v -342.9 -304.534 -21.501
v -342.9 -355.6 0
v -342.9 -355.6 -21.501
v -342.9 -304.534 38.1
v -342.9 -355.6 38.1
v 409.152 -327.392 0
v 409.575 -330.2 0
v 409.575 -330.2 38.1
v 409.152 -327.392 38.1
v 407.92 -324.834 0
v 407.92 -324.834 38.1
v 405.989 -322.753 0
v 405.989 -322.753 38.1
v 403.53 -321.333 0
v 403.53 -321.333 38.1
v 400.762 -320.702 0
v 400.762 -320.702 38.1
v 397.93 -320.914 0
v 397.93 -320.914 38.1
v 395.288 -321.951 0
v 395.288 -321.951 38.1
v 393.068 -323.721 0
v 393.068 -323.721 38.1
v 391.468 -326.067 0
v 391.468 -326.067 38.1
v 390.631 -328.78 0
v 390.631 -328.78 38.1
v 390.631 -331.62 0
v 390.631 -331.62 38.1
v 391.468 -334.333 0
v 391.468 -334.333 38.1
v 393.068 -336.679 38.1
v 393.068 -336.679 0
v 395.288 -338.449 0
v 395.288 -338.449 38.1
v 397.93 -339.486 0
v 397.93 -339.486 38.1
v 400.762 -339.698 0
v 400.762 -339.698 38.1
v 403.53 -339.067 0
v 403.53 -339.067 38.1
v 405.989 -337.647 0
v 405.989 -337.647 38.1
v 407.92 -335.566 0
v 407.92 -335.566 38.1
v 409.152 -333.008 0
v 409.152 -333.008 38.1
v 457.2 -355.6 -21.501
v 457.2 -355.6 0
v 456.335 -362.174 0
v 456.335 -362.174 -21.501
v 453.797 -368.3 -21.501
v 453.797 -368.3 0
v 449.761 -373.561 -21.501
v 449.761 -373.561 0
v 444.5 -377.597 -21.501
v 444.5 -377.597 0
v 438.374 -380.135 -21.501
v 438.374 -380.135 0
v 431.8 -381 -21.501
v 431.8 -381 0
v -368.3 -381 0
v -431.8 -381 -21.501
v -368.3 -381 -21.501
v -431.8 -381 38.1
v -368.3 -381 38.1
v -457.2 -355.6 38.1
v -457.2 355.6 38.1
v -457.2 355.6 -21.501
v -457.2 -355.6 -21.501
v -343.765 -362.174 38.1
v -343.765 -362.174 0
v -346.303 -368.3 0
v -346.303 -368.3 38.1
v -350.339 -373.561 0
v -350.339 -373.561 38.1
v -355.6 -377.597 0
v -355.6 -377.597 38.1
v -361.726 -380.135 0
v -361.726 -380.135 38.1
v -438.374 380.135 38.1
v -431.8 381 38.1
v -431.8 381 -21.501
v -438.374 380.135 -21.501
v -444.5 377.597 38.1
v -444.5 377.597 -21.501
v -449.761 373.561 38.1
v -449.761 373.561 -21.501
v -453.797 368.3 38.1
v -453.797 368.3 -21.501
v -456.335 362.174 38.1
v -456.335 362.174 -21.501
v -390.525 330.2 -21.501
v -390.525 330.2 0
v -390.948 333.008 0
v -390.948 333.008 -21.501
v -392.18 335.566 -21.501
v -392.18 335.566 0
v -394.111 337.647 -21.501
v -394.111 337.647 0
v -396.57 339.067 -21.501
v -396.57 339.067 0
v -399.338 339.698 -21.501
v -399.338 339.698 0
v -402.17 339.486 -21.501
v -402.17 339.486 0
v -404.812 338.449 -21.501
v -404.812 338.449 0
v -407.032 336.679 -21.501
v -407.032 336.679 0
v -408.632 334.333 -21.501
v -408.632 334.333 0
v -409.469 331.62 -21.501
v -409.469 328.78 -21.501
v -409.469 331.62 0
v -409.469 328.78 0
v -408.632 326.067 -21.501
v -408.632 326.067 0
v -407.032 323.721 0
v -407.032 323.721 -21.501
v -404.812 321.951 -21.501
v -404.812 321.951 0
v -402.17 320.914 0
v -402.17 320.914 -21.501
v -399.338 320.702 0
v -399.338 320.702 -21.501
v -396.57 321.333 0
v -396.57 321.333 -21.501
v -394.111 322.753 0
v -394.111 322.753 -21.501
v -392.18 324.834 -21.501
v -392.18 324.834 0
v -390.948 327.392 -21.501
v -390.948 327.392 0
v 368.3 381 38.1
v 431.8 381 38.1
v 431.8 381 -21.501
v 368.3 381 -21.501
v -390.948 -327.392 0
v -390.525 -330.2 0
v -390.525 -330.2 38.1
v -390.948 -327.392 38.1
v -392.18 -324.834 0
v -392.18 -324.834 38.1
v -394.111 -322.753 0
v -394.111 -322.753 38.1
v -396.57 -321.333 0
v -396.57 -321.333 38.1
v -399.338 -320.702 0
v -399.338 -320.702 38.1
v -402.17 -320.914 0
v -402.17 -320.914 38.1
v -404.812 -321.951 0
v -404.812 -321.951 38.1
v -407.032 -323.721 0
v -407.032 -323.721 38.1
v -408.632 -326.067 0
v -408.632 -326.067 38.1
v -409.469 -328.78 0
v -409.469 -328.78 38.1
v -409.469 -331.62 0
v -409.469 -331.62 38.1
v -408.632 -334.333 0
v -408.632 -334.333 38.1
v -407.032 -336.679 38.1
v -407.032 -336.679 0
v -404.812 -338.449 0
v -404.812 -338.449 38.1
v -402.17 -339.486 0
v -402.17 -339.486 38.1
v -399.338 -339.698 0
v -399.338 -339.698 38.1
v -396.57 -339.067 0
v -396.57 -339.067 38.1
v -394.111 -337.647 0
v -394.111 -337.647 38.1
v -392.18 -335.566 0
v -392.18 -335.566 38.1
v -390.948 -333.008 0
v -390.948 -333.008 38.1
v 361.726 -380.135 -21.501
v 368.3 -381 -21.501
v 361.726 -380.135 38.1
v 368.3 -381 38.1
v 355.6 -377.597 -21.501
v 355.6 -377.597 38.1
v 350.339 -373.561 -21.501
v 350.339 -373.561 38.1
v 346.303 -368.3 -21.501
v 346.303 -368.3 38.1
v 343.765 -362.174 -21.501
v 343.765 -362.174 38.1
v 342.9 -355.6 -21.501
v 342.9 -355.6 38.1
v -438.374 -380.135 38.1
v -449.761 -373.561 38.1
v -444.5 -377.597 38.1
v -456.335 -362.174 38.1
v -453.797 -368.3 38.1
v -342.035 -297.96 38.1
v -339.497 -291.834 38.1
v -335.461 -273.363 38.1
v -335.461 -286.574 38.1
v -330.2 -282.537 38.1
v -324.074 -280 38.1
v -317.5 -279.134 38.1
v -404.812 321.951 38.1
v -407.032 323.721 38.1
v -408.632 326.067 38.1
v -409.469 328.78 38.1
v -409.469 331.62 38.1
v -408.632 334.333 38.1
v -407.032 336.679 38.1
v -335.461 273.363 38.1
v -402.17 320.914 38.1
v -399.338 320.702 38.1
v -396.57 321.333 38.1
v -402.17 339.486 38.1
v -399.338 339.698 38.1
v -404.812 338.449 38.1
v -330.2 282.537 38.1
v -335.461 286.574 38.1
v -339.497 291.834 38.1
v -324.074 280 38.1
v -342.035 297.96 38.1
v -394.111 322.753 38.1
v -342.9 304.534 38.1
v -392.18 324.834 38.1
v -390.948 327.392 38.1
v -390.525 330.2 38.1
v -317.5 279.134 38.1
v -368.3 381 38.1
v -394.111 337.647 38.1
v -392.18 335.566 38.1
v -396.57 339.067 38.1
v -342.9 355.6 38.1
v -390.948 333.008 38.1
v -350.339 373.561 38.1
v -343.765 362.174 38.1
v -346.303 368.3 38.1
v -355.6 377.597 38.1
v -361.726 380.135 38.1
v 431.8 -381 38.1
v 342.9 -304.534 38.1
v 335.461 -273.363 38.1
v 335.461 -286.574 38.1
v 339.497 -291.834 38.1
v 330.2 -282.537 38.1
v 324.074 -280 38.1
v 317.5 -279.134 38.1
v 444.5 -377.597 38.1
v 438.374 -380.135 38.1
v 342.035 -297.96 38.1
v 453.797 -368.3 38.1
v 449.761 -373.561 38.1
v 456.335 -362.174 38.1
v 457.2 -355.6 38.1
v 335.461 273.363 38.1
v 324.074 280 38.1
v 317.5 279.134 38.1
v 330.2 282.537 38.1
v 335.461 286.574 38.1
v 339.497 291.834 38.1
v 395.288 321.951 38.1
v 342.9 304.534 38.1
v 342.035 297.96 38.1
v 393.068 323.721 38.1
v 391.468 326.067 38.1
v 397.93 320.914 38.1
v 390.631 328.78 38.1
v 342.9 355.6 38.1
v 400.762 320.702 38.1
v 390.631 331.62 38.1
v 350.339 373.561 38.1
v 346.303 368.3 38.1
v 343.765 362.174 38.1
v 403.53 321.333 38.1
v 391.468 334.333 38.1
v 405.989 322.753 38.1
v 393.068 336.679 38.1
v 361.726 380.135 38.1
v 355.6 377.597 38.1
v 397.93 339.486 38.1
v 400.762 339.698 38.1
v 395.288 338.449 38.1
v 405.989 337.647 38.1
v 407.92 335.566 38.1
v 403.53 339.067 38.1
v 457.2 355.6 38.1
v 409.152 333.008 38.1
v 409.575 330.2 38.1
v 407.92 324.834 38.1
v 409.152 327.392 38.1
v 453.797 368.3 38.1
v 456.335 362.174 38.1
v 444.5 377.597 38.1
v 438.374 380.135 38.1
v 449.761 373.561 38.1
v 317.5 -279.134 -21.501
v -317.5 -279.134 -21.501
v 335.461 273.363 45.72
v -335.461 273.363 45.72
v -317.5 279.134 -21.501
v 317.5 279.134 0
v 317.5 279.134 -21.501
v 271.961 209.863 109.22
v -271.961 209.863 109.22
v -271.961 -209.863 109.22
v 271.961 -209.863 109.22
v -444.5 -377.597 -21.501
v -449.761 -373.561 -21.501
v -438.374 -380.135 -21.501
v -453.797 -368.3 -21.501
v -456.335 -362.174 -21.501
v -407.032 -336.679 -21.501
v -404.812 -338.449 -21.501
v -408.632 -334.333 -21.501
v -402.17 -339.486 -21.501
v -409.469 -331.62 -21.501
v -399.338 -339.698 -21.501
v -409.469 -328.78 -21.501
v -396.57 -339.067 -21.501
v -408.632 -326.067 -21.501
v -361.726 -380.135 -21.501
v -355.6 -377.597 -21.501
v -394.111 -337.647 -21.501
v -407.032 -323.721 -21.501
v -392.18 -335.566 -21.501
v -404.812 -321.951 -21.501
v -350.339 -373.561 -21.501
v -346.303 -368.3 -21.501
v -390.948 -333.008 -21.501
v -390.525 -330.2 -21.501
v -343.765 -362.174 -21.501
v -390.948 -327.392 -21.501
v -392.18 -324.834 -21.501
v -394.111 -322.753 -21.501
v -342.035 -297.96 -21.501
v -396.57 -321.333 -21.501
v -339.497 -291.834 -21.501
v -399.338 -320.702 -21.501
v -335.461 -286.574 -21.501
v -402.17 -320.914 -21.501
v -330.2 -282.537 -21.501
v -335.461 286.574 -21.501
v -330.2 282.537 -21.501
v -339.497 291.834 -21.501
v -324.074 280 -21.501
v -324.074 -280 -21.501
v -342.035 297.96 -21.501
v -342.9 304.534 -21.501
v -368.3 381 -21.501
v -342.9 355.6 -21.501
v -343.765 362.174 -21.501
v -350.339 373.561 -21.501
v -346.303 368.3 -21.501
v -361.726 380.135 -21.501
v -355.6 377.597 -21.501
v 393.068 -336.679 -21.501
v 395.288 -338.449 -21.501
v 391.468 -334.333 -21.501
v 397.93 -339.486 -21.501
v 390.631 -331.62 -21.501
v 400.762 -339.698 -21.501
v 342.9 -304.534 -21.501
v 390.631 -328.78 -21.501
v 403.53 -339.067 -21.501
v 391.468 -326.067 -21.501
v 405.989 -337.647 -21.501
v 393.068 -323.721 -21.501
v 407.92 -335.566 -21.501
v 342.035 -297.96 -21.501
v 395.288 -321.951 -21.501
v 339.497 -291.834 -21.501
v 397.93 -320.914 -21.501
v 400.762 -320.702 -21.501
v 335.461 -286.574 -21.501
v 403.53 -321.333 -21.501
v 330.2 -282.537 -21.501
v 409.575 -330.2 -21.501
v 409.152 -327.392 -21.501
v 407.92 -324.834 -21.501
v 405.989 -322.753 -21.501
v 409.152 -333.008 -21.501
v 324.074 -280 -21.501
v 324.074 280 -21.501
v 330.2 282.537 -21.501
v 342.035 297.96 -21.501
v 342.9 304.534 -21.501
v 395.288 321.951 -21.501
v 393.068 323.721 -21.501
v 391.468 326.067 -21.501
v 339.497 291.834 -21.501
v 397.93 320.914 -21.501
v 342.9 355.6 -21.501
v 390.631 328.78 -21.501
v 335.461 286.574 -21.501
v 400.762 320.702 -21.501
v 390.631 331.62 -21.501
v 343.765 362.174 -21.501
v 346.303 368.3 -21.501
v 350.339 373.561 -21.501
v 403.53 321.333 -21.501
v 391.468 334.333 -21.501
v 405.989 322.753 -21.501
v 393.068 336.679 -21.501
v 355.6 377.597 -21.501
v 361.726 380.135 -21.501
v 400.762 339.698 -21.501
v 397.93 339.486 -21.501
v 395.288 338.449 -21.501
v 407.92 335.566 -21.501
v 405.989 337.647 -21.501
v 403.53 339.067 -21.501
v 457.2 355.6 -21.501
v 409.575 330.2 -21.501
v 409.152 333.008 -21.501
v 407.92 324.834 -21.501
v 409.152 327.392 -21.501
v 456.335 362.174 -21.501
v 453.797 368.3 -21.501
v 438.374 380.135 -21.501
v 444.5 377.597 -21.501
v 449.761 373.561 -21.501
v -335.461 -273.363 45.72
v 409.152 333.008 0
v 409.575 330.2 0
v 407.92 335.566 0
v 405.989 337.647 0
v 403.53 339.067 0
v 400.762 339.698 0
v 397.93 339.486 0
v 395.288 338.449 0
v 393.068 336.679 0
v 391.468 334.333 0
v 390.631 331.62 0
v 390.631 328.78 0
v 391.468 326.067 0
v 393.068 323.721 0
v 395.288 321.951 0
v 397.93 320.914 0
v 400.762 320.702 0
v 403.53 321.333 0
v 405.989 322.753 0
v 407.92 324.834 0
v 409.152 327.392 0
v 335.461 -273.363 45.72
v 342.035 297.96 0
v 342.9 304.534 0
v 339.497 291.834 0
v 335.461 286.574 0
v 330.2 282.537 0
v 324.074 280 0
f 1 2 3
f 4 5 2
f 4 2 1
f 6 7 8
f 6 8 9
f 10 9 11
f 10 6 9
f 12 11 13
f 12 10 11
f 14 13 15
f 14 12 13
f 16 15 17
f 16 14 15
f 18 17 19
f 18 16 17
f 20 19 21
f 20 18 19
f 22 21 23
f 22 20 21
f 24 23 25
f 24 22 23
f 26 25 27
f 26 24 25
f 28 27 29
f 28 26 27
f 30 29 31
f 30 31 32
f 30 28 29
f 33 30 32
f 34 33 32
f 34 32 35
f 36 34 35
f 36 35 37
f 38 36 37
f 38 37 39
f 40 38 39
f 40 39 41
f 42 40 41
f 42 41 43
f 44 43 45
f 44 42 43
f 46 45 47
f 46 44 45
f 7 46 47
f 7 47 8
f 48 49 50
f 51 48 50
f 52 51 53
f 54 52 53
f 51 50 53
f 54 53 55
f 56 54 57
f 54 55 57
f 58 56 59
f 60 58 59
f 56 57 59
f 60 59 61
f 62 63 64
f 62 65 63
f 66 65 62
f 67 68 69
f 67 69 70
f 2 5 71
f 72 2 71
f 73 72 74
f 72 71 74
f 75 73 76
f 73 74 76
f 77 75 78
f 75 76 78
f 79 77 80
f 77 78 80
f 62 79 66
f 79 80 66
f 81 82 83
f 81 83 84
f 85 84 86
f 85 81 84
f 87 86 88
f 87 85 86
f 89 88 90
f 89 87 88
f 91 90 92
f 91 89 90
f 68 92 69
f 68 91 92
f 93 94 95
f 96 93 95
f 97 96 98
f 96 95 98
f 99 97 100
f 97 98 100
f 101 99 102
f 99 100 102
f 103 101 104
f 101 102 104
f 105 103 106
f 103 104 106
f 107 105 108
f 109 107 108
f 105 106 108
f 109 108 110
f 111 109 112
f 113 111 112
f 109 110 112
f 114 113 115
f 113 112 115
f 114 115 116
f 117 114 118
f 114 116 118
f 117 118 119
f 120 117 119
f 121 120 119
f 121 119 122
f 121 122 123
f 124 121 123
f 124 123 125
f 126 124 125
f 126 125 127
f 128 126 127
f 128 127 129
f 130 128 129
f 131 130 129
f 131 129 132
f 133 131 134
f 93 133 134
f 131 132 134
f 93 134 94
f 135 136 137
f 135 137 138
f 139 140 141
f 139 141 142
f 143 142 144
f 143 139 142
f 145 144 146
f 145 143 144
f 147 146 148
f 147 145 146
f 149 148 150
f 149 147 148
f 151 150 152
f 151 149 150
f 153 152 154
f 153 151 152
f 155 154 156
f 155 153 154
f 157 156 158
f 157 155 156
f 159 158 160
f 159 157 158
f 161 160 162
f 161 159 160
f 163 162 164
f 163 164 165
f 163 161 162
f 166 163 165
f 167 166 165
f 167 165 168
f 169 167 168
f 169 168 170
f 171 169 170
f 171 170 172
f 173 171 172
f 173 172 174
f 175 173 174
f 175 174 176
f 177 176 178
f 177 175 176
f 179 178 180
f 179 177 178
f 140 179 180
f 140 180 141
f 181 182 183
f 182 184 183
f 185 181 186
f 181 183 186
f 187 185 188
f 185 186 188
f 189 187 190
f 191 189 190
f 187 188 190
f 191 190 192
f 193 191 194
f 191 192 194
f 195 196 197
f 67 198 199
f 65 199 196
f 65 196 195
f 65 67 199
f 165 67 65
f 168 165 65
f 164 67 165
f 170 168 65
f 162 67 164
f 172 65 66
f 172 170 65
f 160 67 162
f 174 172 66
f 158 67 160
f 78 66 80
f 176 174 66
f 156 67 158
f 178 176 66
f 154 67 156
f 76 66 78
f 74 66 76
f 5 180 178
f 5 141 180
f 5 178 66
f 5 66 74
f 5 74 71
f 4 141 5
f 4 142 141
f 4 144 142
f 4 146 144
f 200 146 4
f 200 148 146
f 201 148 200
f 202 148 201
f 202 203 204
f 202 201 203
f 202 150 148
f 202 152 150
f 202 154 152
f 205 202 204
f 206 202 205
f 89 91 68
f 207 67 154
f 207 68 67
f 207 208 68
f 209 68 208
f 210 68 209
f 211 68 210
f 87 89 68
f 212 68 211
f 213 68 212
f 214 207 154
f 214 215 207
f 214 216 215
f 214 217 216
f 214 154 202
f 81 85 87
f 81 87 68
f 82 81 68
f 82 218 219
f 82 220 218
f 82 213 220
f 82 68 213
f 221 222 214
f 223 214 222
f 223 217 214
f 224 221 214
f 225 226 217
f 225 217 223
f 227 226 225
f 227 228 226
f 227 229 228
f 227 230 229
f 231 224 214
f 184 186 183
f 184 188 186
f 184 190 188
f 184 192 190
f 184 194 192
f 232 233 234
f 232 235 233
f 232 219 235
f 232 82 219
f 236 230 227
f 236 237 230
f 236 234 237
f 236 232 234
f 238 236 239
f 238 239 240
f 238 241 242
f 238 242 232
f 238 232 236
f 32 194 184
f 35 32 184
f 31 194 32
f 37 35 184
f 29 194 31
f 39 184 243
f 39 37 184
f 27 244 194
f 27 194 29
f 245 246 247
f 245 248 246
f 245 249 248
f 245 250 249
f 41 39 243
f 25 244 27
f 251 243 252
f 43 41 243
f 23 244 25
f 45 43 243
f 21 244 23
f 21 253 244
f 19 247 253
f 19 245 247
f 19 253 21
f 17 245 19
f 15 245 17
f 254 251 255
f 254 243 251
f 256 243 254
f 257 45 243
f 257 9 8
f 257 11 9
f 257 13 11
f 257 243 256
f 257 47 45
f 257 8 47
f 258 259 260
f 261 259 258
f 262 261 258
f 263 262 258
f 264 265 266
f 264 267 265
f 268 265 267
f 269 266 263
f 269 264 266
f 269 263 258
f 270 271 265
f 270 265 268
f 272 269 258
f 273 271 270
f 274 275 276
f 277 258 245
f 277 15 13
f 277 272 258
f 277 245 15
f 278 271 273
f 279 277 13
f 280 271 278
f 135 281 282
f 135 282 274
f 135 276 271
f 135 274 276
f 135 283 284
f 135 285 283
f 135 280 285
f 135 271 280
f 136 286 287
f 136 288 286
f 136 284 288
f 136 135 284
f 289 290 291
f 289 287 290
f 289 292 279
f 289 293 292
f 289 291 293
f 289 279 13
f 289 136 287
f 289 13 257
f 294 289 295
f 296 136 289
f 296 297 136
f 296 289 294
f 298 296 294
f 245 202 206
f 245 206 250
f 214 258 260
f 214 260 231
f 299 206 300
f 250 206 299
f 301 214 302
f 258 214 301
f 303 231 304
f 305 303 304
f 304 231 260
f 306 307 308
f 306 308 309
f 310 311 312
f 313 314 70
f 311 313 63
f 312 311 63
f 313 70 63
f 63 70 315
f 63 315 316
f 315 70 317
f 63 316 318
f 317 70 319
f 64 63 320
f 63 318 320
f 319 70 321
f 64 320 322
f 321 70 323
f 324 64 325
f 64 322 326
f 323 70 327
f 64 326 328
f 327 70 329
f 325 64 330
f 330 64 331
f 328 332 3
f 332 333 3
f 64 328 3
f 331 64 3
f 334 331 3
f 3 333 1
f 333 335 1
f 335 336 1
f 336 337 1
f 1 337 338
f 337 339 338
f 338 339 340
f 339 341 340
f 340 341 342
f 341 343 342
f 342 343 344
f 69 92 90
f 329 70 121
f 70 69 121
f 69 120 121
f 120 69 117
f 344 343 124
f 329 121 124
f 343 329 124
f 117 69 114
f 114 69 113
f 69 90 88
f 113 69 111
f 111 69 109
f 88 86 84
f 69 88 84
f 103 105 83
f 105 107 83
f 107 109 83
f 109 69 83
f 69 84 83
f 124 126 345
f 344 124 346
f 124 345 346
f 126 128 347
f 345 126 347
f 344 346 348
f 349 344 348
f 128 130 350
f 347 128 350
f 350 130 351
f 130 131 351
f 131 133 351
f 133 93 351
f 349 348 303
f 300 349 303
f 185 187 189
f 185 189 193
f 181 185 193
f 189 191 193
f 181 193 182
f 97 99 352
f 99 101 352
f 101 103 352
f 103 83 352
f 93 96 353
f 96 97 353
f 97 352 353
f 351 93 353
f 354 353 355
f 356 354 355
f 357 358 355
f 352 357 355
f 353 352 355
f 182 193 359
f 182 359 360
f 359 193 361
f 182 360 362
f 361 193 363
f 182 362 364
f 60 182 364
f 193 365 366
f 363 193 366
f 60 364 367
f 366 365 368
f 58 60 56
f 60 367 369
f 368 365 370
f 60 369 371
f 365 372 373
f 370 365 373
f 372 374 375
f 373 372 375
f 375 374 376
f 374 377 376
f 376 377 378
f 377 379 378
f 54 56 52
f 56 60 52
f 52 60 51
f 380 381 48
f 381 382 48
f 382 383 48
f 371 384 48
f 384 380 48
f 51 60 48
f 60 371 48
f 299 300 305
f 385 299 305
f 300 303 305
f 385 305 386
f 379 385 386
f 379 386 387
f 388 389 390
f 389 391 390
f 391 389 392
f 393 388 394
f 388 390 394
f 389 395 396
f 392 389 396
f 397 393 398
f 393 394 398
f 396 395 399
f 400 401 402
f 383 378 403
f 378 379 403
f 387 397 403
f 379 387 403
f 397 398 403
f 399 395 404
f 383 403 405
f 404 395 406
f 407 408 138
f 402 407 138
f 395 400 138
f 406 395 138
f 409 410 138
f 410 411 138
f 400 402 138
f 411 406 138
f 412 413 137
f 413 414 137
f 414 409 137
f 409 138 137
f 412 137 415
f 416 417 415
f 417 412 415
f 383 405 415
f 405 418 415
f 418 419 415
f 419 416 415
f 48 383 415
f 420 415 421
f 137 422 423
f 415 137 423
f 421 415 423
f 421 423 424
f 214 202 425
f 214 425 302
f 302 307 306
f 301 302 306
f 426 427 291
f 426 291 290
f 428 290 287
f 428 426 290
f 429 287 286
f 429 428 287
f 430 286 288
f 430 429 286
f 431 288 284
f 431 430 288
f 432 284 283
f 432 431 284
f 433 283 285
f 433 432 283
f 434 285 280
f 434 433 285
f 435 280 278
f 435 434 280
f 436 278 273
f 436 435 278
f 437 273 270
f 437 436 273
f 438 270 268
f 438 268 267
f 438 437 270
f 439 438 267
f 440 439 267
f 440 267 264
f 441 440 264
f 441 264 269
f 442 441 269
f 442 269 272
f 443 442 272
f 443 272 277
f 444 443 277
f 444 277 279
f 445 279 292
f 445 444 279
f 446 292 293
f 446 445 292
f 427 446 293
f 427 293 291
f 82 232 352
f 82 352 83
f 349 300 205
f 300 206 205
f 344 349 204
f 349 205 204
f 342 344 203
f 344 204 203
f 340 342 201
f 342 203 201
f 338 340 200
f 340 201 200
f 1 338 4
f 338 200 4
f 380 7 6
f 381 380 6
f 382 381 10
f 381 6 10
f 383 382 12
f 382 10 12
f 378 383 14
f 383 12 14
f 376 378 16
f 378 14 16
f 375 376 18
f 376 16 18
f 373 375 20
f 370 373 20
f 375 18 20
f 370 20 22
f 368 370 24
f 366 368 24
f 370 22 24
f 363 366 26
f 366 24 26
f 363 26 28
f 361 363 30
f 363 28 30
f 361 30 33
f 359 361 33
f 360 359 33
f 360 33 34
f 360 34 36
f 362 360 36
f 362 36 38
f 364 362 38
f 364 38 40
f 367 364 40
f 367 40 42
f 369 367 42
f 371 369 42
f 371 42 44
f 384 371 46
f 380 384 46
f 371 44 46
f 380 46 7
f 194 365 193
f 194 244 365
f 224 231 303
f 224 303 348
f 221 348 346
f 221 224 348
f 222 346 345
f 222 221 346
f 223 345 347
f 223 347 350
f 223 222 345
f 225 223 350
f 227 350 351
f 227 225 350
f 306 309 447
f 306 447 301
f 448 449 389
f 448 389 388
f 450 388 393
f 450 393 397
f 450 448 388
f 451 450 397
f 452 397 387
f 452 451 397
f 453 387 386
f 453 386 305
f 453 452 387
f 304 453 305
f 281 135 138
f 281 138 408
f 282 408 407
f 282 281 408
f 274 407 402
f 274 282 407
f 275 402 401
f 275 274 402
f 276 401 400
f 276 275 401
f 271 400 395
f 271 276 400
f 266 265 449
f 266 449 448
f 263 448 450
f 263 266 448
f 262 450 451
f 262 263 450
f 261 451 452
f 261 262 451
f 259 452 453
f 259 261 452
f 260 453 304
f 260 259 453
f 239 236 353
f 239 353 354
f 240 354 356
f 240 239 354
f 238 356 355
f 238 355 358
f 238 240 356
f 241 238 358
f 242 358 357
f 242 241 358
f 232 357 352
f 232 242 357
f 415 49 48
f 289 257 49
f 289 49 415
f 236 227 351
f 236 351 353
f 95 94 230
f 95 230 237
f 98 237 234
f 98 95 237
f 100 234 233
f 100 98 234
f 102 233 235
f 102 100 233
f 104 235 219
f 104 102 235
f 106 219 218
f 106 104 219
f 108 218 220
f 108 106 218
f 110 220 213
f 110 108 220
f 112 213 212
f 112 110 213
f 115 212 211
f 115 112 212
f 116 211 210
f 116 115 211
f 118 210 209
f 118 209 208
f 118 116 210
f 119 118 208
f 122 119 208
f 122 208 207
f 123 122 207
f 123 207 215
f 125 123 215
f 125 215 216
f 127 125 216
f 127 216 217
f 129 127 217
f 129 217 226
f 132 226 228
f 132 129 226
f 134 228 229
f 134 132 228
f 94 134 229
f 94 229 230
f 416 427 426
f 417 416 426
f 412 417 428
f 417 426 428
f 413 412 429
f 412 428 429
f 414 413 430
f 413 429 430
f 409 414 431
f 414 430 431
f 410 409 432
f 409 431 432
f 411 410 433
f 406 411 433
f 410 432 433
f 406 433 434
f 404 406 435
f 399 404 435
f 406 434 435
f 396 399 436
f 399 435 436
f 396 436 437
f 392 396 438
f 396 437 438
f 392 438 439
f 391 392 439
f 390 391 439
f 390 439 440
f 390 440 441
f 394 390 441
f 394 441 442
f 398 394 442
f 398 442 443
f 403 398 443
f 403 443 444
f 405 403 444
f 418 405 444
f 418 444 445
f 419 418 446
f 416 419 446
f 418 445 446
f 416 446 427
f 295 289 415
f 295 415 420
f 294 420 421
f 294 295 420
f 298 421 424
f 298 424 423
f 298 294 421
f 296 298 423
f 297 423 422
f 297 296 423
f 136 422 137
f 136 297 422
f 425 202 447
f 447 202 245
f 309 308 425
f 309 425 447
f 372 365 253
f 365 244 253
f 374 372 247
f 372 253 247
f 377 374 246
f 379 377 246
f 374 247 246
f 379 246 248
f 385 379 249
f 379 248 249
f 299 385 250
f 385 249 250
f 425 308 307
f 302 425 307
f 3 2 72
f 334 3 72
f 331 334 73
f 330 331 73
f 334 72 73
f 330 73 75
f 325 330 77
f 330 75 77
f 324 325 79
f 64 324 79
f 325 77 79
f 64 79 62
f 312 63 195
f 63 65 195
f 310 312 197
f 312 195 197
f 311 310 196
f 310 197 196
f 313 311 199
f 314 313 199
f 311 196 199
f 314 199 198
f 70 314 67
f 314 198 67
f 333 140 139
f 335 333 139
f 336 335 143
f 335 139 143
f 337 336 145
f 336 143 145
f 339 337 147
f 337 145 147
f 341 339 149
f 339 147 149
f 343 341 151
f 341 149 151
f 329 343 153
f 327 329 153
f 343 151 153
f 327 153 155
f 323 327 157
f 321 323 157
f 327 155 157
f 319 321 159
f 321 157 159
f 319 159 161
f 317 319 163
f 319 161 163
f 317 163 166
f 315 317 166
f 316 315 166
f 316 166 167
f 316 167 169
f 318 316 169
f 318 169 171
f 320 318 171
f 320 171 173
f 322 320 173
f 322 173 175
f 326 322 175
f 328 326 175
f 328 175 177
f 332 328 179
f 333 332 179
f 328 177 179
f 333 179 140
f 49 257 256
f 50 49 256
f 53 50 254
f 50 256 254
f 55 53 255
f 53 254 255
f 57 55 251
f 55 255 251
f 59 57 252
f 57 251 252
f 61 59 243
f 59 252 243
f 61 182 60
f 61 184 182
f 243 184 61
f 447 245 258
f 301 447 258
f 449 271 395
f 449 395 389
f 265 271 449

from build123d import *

# Parameters (mm, degrees)
F0_R     = 9.525
F0_W     = 685.8
F0_H     = 558.2681298256
F1_DEPTH = 38.1
F2_R     = 25.4
F3_W     = 670.9210244843
F3_H     = 546.7255115509
F4_DEPTH = 71.12
F5_SIZE  = 63.5
F6_DEPTH = 21.5011


with BuildPart() as f1:
    # F0 (on Top) → F1 (new body)
    with BuildSketch(Plane.XY):
        Polygon((457.2, -381), (457.2, 381), (342.9, 381), (342.9, 279.1340649128), (342.9, -279.1340649128), (342.9, -381), align=None)
        with Locations((400.05, -330.2)):
            Circle(F0_R, mode=Mode.SUBTRACT)
        with Locations((400.05, 330.2)):
            Circle(F0_R, mode=Mode.SUBTRACT)
        Rectangle(F0_W, F0_H)
        Polygon((-342.9, -279.1340649128), (-342.9, 279.1340649128), (-342.9, 381), (-457.2, 381), (-457.2, -381), (-342.9, -381), align=None)
        with Locations((-400.05, -330.2)):
            Circle(F0_R, mode=Mode.SUBTRACT)
        with Locations((-400.05, 330.2)):
            Circle(F0_R, mode=Mode.SUBTRACT)
    extrude(amount=F1_DEPTH)

    # F2
    f2_edges = [f1.edges().sort_by_distance(p)[0] for p in [
        (-457.2, -381, 19.05),
        (-342.9, -381, 19.05),
        (342.9, -381, 19.05),
        (457.2, -381, 19.05),
        (342.9, 381, 19.05),
        (-457.2, 381, 19.05),
        (-342.9, -279.134065, 19.05),
        (342.9, -279.134065, 19.05),
        (457.2, 381, 19.05),
        (-342.9, 279.134065, 19.05),
        (-342.9, 381, 19.05),
        (342.9, 279.134065, 19.05),
    ]]
    fillet(f2_edges, radius=F2_R)

    # F3 (on face) → F4 (join)
    with BuildSketch(Plane.XY.offset(38.1)):
        Rectangle(F3_W, F3_H)
    extrude(amount=F4_DEPTH)

    # F5
    f5_edges = [f1.edges().sort_by_distance(p)[0] for p in [
        (0, 273.362756, 109.22),
        (335.460512, 0, 109.22),
        (-335.460512, 0, 109.22),
        (0, -273.362756, 109.22),
    ]]
    chamfer(f5_edges, length=F5_SIZE)

    # F6 (add): a face of the model
    f6_faces = [f1.faces().sort_by_distance(p)[0] for p in [
        (0, 0, 0),
    ]]
    extrude(f6_faces, amount=F6_DEPTH)


solid = f1.part
